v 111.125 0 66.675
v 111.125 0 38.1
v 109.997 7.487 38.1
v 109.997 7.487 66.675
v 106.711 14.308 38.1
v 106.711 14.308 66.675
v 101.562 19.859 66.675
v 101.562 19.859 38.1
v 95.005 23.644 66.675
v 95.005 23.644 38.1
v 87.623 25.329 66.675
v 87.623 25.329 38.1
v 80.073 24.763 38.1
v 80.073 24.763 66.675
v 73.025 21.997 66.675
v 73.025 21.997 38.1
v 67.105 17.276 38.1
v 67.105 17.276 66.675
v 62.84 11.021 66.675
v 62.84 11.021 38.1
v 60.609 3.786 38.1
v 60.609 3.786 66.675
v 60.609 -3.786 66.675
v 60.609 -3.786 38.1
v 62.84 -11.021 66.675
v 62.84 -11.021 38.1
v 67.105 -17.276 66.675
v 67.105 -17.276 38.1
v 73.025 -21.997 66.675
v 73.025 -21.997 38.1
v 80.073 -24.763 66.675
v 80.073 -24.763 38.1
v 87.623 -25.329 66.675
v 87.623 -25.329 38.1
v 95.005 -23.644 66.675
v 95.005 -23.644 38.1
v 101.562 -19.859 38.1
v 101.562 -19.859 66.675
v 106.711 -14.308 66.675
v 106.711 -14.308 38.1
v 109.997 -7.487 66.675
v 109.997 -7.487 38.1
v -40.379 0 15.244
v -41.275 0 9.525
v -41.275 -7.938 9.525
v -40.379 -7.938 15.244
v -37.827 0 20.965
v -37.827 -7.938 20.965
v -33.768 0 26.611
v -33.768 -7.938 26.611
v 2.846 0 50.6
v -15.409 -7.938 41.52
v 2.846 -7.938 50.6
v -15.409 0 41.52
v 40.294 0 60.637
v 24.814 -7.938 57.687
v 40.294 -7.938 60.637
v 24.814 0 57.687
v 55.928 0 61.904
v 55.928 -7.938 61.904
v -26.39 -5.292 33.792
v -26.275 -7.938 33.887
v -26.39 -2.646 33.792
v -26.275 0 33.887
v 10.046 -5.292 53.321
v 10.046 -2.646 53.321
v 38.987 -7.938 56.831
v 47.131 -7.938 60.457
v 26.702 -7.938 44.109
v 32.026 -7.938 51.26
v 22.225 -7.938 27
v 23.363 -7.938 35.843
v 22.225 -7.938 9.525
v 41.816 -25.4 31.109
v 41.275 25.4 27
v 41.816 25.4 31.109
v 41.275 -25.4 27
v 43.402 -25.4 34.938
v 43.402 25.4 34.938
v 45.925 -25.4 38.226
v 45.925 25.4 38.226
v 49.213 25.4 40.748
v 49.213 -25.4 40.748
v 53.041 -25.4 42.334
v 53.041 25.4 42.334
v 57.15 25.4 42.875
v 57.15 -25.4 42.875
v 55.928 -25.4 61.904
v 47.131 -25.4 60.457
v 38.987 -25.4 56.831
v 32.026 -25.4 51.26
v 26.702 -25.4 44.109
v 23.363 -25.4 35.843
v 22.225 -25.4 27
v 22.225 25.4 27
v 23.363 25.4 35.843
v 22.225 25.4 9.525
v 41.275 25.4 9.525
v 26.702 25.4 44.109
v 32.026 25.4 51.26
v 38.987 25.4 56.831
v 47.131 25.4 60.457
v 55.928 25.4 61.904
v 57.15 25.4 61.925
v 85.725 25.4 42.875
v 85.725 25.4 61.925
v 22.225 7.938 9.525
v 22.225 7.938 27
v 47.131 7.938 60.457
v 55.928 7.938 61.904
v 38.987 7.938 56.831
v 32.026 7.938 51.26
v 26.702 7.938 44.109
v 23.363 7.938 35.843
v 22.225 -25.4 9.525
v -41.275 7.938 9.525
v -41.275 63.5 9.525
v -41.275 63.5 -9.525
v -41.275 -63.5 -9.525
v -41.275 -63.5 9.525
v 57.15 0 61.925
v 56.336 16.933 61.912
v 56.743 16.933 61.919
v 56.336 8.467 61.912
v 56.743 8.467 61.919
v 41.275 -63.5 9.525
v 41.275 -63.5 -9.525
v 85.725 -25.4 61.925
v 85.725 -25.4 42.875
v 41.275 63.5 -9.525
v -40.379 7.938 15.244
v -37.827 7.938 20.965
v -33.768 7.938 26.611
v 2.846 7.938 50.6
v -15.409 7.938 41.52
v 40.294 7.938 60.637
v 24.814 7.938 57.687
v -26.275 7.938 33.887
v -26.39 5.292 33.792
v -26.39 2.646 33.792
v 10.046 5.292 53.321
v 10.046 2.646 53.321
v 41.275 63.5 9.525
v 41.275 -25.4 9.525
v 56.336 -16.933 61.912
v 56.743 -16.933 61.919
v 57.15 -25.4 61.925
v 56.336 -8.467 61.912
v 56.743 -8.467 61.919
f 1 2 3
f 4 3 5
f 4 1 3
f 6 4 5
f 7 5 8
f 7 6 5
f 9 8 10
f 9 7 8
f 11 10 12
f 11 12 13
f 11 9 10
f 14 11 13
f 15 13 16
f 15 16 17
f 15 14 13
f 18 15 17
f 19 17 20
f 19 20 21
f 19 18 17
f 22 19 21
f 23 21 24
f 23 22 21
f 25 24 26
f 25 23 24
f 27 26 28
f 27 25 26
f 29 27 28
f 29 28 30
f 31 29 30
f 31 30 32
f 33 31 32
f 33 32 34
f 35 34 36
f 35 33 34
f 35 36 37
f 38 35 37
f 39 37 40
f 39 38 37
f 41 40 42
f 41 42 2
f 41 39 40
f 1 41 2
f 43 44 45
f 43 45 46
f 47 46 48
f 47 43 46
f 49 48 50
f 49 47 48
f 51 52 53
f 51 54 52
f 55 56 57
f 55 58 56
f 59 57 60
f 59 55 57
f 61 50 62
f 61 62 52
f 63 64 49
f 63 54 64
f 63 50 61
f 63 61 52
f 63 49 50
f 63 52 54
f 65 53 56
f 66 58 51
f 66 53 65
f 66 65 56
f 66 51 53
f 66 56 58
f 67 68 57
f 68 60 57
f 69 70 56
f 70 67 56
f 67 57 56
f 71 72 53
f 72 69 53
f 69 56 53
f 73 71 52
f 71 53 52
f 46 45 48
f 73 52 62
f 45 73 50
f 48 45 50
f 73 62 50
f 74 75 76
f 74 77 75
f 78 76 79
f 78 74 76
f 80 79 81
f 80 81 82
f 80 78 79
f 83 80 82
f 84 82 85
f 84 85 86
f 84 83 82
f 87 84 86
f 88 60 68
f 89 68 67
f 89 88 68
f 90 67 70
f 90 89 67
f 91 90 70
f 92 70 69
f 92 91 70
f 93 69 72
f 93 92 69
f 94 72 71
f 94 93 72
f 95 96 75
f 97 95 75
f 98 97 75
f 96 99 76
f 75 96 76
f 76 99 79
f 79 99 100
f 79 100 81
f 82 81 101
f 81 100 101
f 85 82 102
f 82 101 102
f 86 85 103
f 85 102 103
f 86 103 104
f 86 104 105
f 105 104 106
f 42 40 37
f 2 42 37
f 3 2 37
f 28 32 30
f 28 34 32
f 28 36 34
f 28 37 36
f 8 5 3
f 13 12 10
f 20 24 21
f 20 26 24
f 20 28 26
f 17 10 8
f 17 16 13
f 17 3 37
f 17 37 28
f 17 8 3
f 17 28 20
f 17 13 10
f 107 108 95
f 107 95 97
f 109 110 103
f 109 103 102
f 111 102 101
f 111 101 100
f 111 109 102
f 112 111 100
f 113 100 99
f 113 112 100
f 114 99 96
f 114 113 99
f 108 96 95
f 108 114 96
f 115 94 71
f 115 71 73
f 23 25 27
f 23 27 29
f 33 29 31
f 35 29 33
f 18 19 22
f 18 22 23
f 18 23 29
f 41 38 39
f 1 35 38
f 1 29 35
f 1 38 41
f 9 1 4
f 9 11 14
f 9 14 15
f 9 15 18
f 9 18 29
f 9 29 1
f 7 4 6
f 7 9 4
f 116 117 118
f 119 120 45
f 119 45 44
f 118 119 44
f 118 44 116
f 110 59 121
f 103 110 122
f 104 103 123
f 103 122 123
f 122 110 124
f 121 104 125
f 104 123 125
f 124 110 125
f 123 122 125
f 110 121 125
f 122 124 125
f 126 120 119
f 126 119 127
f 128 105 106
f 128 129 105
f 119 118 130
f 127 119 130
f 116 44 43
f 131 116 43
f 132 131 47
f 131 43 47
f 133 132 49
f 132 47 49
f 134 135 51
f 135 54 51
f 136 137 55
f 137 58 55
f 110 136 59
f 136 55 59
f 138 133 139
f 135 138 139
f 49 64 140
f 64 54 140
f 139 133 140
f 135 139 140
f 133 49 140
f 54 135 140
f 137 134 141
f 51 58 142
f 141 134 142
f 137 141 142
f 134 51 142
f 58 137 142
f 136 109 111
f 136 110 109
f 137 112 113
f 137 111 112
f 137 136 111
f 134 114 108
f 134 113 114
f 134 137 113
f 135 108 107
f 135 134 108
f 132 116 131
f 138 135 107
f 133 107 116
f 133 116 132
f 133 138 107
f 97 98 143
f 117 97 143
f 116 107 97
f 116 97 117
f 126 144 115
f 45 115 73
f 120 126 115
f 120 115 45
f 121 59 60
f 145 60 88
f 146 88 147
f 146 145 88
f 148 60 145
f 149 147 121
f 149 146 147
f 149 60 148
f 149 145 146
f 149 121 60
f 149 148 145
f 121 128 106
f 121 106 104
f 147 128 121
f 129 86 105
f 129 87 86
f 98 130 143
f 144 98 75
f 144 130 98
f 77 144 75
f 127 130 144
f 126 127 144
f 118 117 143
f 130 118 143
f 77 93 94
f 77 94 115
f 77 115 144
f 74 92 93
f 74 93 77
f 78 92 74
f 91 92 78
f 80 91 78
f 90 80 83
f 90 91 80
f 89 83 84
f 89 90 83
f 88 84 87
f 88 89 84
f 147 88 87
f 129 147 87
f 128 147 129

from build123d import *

# Parameters (mm, degrees)
F1_DEPTH = 63.5
F2_DEPTH = 7.9375
F0_W     = 25.4
F0_H     = 19.05
F3_DEPTH = 25.4


with BuildPart() as f1:
    # F0 (on Front) → F1 (new body, symmetric)
    with BuildSketch(Plane.XZ):
        Polygon((22.225, 9.525), (-41.275, 9.525), (-41.275, -9.525), (41.275, -9.525), (41.275, 9.525), align=None)
    extrude(amount=F1_DEPTH, both=True)

    # F0 (on Front) → F2 (join, symmetric)
    with BuildSketch(Plane.XZ):
        with BuildLine():
            add(Edge.make_bspline(
                [(-41.275, 9.525), (-41.2005666436, 34.0914382692), (9.3580758383, 60.8635541986), (55.9280401004, 61.9038164173)],
                knots=[0, 0, 0, 0, 110.5369802085, 110.5369802085, 110.5369802085, 110.5369802085], degree=3))
            Line((-41.275, 9.525), (22.225, 9.525))
            Line((22.225, 9.525), (22.225, 27.0002))
            ThreePointArc((22.225, 27.0002), (32.025981865, 51.260029714), (55.9280401004, 61.9038164173))
        make_face()
    extrude(amount=F2_DEPTH, both=True)

    # F0 (on Front) → F3 (join, symmetric)
    with BuildSketch(Plane.XZ):
        with Locations((73.025, 52.4002)):
            Rectangle(F0_W, F0_H)
        with BuildLine():
            Line((22.225, 27.0002), (22.225, 9.525))
            Line((22.225, 9.525), (41.275, 9.525))
            Line((41.275, 9.525), (41.275, 27.0002))
            ThreePointArc((41.275, 27.0002), (45.9246798487, 38.2255201513), (57.15, 42.8752))
            Line((57.15, 42.8752), (60.325, 42.8752))
            Line((60.325, 42.8752), (60.325, 61.9252))
            Line((60.325, 61.9252), (57.15, 61.9252))
            add(Edge.make_bspline(
                [(55.9280401004, 61.9038164173), (56.3356778535, 61.912922075), (56.7430099977, 61.9200561814), (57.15, 61.9252)],
                knots=[110.5369802085, 110.5369802085, 110.5369802085, 110.5369802085, 111.5045361635, 111.5045361635, 111.5045361635, 111.5045361635], degree=3))
            ThreePointArc((55.9280401004, 61.9038164173), (32.025981865, 51.260029714), (22.225, 27.0002))
        make_face()
    extrude(amount=F3_DEPTH, both=True)


with BuildPart() as f4:
    # F0 (on Front) → F4 (revolve)
    with BuildSketch(Plane.XZ):
        Polygon((85.725, 66.675), (85.725, 61.9252), (85.725, 42.8752), (85.725, 38.1), (111.125, 38.1), (111.125, 66.675), align=None)
    revolve(axis=Axis((85.725, 0, 54.7751), (0, 0, 1)))


solid = Compound([f1.part, f4.part])
